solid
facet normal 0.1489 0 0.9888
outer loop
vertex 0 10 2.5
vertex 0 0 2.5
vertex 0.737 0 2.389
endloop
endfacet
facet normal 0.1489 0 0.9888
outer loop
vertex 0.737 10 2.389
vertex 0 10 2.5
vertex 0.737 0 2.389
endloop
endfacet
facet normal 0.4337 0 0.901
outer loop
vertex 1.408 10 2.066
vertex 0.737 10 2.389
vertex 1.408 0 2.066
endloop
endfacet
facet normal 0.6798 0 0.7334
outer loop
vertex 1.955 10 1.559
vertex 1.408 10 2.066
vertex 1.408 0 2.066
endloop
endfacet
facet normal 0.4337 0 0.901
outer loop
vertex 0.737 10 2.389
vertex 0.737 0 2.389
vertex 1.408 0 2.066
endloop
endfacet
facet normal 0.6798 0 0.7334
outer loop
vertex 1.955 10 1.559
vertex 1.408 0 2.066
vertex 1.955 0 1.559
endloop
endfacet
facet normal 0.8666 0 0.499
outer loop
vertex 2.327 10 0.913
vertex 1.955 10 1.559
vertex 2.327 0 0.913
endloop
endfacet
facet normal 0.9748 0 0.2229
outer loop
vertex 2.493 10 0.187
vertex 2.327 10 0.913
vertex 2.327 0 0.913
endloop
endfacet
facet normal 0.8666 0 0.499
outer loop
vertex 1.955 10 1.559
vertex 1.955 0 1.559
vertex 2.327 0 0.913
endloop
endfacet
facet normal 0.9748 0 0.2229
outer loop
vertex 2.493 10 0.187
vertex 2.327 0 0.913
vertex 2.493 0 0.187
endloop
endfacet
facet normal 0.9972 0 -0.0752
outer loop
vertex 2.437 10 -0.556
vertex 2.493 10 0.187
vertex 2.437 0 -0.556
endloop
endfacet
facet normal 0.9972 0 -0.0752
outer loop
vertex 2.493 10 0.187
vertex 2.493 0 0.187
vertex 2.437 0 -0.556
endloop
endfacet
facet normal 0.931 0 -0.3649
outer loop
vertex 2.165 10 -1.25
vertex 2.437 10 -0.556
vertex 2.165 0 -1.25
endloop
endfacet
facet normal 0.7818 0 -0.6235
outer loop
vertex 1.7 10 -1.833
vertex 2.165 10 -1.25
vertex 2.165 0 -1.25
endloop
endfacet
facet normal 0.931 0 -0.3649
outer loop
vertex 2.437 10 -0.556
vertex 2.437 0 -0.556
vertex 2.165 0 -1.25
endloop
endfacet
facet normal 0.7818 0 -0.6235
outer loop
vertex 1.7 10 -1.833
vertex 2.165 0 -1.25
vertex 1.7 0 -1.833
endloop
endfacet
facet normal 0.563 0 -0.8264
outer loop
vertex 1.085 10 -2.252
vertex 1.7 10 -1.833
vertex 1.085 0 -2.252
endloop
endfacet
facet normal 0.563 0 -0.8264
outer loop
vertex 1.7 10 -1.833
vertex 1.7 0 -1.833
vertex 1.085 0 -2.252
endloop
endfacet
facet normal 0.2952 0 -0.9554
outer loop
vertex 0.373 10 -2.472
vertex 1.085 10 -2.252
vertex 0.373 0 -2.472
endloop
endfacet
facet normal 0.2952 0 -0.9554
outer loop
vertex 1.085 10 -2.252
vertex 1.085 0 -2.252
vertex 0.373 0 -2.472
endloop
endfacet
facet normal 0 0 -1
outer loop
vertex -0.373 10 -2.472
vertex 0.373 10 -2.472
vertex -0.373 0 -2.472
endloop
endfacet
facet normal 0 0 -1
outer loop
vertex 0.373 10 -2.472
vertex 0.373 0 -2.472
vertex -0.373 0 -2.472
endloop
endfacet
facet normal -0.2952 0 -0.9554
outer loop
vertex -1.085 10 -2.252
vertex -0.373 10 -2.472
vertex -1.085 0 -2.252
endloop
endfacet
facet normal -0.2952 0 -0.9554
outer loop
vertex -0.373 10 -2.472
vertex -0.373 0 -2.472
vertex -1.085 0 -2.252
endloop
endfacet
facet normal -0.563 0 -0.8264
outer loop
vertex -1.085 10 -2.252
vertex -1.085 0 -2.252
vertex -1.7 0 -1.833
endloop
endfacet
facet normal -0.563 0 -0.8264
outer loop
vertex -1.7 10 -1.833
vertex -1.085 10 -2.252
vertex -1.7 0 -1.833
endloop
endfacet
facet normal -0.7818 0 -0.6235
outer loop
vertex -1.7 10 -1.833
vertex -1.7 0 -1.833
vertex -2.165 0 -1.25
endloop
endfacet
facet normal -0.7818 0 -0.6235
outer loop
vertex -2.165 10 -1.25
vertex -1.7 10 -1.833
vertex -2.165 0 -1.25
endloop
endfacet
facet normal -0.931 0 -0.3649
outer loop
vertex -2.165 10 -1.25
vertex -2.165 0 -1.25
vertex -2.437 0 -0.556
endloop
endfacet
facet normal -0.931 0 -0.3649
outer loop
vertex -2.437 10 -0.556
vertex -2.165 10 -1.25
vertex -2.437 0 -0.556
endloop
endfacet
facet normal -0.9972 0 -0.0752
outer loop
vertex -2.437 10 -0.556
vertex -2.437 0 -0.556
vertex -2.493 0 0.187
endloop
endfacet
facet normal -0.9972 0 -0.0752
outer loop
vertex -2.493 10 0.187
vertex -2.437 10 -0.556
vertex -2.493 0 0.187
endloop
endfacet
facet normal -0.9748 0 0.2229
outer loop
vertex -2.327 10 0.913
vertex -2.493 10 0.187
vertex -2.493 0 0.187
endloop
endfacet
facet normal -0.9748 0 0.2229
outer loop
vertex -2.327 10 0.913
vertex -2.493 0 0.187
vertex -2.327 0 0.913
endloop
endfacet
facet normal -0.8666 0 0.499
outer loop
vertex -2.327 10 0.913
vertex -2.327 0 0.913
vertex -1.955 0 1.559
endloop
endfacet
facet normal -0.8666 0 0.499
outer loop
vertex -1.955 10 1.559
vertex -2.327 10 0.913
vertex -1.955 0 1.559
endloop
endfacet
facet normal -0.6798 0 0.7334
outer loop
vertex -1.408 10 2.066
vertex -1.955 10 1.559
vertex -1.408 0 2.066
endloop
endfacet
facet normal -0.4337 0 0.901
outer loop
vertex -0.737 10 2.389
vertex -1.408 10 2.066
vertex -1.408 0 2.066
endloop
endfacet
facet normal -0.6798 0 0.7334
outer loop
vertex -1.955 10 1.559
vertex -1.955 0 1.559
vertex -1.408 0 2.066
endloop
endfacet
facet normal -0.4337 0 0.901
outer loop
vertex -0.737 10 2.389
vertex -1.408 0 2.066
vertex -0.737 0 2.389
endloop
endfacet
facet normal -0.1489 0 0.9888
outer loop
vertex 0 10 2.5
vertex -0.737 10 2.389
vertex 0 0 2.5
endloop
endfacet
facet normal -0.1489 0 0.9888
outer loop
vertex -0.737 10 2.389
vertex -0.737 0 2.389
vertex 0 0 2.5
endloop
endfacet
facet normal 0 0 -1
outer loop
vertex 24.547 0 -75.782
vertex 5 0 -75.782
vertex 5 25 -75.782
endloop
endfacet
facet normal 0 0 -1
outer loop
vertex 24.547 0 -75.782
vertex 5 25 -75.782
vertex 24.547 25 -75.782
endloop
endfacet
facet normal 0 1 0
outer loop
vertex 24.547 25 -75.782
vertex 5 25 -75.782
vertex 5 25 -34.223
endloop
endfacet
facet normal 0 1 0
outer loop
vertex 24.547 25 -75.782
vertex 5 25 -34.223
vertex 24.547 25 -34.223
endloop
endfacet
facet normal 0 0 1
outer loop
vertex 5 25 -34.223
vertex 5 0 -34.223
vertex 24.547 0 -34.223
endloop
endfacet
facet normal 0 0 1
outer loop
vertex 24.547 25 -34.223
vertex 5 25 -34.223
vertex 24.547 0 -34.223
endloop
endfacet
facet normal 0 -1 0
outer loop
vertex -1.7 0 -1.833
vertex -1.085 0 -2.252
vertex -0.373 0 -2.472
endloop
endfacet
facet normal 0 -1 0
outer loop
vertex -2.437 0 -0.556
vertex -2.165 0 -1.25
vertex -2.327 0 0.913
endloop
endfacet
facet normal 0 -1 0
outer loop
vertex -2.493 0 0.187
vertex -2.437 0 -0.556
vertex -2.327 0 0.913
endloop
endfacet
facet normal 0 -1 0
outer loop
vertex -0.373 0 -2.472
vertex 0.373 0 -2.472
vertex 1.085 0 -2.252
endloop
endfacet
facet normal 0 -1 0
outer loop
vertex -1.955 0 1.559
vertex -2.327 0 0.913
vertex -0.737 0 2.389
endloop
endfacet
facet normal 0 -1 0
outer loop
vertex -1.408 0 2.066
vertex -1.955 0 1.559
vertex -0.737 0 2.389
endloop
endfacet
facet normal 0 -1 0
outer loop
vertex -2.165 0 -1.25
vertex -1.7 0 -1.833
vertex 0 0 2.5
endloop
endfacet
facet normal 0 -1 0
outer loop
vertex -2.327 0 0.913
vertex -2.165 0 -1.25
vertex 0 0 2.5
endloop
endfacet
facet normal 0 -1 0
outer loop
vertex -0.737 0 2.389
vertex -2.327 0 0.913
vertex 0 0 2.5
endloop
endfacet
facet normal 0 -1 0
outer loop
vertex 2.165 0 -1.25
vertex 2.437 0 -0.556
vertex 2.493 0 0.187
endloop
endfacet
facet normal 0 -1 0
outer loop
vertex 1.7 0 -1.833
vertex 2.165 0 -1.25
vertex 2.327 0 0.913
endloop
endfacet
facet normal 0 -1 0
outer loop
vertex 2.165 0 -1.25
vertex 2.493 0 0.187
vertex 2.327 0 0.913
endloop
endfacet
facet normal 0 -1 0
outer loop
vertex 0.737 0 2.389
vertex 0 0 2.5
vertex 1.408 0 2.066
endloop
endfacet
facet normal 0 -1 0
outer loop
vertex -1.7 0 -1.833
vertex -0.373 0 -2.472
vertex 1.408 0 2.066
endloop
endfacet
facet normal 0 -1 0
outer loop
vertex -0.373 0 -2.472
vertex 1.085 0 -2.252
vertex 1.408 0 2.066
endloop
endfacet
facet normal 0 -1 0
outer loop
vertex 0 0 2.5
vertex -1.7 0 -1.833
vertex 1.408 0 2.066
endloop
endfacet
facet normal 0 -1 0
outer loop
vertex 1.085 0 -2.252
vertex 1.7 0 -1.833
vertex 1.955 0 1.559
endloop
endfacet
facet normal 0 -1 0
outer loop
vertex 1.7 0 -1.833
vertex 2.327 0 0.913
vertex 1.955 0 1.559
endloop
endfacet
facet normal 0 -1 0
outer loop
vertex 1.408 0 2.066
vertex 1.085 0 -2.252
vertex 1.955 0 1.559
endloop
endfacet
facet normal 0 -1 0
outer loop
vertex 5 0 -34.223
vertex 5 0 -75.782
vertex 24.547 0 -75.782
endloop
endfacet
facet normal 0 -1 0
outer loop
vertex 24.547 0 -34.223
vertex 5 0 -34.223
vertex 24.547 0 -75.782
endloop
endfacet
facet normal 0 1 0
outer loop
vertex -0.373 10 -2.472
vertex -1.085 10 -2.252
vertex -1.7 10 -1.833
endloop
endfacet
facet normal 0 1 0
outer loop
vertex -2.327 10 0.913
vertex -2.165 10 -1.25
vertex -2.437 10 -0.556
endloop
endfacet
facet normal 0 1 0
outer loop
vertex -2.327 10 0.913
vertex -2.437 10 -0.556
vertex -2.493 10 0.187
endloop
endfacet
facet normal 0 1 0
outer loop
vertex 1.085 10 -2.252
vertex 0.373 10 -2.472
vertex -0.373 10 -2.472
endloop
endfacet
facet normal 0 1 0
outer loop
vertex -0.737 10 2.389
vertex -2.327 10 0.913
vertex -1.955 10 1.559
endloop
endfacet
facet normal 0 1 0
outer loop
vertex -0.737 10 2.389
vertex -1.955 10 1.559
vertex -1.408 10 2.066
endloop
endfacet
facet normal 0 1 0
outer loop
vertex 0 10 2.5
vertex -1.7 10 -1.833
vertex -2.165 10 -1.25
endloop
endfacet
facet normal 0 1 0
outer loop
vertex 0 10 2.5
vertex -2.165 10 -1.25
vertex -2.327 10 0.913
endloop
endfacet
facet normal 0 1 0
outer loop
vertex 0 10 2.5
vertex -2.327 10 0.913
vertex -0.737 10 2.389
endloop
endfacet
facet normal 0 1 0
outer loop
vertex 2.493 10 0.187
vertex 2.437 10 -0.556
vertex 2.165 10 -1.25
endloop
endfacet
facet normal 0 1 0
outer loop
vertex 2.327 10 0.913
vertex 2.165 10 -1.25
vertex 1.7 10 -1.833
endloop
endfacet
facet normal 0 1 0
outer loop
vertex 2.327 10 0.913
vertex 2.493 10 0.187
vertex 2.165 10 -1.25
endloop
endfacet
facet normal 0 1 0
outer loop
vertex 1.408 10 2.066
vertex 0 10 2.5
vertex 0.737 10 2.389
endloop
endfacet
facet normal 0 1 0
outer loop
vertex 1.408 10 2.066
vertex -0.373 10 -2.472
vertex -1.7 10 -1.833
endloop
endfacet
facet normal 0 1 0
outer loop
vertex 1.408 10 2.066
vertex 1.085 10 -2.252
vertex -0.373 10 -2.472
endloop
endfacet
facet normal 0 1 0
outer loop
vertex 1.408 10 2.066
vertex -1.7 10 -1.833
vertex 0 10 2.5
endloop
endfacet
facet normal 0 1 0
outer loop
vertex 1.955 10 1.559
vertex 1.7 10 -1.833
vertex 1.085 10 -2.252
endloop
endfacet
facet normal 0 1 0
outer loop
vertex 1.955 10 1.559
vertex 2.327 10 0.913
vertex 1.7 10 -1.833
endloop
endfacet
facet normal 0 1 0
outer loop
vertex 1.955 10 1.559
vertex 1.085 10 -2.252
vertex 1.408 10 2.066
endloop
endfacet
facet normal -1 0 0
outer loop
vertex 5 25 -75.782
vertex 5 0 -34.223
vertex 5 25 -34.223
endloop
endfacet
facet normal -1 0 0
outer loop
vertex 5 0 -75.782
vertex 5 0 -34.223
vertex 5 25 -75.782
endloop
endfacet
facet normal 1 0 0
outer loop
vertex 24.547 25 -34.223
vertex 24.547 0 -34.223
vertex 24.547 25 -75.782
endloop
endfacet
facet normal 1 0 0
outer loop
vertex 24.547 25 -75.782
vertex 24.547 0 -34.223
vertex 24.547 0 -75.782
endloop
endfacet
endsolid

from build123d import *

# Parameters (mm, degrees)
CROQUIS1_R              = 2.5
SALIENTE_EXTRUIR1_DEPTH = 10
CROQUIS2_W              = 19.547187756
CROQUIS2_H              = 41.558983128
SALIENTE_EXTRUIR2_DEPTH = 25


with BuildPart() as part:
    # Croquis1 → Saliente-Extruir1 (new body)
    with BuildSketch(Plane(origin=(0, 0, 0), x_dir=(1, 0, 0), z_dir=(0, 1, 0))):
        with Locations(Location((0, 0, 0), (0, 0, 270))):
            Circle(CROQUIS1_R)
    extrude(amount=SALIENTE_EXTRUIR1_DEPTH)


with BuildPart() as body_2:
    # Croquis2 → Saliente-Extruir2 (new body)
    with BuildSketch(Plane(origin=(0, 0, 0), x_dir=(1, 0, 0), z_dir=(0, 1, 0))):
        with Locations((14.773593878, 55.00269981)):
            Rectangle(CROQUIS2_W, CROQUIS2_H)
    extrude(amount=SALIENTE_EXTRUIR2_DEPTH)


solid = Compound([part.part, body_2.part])
